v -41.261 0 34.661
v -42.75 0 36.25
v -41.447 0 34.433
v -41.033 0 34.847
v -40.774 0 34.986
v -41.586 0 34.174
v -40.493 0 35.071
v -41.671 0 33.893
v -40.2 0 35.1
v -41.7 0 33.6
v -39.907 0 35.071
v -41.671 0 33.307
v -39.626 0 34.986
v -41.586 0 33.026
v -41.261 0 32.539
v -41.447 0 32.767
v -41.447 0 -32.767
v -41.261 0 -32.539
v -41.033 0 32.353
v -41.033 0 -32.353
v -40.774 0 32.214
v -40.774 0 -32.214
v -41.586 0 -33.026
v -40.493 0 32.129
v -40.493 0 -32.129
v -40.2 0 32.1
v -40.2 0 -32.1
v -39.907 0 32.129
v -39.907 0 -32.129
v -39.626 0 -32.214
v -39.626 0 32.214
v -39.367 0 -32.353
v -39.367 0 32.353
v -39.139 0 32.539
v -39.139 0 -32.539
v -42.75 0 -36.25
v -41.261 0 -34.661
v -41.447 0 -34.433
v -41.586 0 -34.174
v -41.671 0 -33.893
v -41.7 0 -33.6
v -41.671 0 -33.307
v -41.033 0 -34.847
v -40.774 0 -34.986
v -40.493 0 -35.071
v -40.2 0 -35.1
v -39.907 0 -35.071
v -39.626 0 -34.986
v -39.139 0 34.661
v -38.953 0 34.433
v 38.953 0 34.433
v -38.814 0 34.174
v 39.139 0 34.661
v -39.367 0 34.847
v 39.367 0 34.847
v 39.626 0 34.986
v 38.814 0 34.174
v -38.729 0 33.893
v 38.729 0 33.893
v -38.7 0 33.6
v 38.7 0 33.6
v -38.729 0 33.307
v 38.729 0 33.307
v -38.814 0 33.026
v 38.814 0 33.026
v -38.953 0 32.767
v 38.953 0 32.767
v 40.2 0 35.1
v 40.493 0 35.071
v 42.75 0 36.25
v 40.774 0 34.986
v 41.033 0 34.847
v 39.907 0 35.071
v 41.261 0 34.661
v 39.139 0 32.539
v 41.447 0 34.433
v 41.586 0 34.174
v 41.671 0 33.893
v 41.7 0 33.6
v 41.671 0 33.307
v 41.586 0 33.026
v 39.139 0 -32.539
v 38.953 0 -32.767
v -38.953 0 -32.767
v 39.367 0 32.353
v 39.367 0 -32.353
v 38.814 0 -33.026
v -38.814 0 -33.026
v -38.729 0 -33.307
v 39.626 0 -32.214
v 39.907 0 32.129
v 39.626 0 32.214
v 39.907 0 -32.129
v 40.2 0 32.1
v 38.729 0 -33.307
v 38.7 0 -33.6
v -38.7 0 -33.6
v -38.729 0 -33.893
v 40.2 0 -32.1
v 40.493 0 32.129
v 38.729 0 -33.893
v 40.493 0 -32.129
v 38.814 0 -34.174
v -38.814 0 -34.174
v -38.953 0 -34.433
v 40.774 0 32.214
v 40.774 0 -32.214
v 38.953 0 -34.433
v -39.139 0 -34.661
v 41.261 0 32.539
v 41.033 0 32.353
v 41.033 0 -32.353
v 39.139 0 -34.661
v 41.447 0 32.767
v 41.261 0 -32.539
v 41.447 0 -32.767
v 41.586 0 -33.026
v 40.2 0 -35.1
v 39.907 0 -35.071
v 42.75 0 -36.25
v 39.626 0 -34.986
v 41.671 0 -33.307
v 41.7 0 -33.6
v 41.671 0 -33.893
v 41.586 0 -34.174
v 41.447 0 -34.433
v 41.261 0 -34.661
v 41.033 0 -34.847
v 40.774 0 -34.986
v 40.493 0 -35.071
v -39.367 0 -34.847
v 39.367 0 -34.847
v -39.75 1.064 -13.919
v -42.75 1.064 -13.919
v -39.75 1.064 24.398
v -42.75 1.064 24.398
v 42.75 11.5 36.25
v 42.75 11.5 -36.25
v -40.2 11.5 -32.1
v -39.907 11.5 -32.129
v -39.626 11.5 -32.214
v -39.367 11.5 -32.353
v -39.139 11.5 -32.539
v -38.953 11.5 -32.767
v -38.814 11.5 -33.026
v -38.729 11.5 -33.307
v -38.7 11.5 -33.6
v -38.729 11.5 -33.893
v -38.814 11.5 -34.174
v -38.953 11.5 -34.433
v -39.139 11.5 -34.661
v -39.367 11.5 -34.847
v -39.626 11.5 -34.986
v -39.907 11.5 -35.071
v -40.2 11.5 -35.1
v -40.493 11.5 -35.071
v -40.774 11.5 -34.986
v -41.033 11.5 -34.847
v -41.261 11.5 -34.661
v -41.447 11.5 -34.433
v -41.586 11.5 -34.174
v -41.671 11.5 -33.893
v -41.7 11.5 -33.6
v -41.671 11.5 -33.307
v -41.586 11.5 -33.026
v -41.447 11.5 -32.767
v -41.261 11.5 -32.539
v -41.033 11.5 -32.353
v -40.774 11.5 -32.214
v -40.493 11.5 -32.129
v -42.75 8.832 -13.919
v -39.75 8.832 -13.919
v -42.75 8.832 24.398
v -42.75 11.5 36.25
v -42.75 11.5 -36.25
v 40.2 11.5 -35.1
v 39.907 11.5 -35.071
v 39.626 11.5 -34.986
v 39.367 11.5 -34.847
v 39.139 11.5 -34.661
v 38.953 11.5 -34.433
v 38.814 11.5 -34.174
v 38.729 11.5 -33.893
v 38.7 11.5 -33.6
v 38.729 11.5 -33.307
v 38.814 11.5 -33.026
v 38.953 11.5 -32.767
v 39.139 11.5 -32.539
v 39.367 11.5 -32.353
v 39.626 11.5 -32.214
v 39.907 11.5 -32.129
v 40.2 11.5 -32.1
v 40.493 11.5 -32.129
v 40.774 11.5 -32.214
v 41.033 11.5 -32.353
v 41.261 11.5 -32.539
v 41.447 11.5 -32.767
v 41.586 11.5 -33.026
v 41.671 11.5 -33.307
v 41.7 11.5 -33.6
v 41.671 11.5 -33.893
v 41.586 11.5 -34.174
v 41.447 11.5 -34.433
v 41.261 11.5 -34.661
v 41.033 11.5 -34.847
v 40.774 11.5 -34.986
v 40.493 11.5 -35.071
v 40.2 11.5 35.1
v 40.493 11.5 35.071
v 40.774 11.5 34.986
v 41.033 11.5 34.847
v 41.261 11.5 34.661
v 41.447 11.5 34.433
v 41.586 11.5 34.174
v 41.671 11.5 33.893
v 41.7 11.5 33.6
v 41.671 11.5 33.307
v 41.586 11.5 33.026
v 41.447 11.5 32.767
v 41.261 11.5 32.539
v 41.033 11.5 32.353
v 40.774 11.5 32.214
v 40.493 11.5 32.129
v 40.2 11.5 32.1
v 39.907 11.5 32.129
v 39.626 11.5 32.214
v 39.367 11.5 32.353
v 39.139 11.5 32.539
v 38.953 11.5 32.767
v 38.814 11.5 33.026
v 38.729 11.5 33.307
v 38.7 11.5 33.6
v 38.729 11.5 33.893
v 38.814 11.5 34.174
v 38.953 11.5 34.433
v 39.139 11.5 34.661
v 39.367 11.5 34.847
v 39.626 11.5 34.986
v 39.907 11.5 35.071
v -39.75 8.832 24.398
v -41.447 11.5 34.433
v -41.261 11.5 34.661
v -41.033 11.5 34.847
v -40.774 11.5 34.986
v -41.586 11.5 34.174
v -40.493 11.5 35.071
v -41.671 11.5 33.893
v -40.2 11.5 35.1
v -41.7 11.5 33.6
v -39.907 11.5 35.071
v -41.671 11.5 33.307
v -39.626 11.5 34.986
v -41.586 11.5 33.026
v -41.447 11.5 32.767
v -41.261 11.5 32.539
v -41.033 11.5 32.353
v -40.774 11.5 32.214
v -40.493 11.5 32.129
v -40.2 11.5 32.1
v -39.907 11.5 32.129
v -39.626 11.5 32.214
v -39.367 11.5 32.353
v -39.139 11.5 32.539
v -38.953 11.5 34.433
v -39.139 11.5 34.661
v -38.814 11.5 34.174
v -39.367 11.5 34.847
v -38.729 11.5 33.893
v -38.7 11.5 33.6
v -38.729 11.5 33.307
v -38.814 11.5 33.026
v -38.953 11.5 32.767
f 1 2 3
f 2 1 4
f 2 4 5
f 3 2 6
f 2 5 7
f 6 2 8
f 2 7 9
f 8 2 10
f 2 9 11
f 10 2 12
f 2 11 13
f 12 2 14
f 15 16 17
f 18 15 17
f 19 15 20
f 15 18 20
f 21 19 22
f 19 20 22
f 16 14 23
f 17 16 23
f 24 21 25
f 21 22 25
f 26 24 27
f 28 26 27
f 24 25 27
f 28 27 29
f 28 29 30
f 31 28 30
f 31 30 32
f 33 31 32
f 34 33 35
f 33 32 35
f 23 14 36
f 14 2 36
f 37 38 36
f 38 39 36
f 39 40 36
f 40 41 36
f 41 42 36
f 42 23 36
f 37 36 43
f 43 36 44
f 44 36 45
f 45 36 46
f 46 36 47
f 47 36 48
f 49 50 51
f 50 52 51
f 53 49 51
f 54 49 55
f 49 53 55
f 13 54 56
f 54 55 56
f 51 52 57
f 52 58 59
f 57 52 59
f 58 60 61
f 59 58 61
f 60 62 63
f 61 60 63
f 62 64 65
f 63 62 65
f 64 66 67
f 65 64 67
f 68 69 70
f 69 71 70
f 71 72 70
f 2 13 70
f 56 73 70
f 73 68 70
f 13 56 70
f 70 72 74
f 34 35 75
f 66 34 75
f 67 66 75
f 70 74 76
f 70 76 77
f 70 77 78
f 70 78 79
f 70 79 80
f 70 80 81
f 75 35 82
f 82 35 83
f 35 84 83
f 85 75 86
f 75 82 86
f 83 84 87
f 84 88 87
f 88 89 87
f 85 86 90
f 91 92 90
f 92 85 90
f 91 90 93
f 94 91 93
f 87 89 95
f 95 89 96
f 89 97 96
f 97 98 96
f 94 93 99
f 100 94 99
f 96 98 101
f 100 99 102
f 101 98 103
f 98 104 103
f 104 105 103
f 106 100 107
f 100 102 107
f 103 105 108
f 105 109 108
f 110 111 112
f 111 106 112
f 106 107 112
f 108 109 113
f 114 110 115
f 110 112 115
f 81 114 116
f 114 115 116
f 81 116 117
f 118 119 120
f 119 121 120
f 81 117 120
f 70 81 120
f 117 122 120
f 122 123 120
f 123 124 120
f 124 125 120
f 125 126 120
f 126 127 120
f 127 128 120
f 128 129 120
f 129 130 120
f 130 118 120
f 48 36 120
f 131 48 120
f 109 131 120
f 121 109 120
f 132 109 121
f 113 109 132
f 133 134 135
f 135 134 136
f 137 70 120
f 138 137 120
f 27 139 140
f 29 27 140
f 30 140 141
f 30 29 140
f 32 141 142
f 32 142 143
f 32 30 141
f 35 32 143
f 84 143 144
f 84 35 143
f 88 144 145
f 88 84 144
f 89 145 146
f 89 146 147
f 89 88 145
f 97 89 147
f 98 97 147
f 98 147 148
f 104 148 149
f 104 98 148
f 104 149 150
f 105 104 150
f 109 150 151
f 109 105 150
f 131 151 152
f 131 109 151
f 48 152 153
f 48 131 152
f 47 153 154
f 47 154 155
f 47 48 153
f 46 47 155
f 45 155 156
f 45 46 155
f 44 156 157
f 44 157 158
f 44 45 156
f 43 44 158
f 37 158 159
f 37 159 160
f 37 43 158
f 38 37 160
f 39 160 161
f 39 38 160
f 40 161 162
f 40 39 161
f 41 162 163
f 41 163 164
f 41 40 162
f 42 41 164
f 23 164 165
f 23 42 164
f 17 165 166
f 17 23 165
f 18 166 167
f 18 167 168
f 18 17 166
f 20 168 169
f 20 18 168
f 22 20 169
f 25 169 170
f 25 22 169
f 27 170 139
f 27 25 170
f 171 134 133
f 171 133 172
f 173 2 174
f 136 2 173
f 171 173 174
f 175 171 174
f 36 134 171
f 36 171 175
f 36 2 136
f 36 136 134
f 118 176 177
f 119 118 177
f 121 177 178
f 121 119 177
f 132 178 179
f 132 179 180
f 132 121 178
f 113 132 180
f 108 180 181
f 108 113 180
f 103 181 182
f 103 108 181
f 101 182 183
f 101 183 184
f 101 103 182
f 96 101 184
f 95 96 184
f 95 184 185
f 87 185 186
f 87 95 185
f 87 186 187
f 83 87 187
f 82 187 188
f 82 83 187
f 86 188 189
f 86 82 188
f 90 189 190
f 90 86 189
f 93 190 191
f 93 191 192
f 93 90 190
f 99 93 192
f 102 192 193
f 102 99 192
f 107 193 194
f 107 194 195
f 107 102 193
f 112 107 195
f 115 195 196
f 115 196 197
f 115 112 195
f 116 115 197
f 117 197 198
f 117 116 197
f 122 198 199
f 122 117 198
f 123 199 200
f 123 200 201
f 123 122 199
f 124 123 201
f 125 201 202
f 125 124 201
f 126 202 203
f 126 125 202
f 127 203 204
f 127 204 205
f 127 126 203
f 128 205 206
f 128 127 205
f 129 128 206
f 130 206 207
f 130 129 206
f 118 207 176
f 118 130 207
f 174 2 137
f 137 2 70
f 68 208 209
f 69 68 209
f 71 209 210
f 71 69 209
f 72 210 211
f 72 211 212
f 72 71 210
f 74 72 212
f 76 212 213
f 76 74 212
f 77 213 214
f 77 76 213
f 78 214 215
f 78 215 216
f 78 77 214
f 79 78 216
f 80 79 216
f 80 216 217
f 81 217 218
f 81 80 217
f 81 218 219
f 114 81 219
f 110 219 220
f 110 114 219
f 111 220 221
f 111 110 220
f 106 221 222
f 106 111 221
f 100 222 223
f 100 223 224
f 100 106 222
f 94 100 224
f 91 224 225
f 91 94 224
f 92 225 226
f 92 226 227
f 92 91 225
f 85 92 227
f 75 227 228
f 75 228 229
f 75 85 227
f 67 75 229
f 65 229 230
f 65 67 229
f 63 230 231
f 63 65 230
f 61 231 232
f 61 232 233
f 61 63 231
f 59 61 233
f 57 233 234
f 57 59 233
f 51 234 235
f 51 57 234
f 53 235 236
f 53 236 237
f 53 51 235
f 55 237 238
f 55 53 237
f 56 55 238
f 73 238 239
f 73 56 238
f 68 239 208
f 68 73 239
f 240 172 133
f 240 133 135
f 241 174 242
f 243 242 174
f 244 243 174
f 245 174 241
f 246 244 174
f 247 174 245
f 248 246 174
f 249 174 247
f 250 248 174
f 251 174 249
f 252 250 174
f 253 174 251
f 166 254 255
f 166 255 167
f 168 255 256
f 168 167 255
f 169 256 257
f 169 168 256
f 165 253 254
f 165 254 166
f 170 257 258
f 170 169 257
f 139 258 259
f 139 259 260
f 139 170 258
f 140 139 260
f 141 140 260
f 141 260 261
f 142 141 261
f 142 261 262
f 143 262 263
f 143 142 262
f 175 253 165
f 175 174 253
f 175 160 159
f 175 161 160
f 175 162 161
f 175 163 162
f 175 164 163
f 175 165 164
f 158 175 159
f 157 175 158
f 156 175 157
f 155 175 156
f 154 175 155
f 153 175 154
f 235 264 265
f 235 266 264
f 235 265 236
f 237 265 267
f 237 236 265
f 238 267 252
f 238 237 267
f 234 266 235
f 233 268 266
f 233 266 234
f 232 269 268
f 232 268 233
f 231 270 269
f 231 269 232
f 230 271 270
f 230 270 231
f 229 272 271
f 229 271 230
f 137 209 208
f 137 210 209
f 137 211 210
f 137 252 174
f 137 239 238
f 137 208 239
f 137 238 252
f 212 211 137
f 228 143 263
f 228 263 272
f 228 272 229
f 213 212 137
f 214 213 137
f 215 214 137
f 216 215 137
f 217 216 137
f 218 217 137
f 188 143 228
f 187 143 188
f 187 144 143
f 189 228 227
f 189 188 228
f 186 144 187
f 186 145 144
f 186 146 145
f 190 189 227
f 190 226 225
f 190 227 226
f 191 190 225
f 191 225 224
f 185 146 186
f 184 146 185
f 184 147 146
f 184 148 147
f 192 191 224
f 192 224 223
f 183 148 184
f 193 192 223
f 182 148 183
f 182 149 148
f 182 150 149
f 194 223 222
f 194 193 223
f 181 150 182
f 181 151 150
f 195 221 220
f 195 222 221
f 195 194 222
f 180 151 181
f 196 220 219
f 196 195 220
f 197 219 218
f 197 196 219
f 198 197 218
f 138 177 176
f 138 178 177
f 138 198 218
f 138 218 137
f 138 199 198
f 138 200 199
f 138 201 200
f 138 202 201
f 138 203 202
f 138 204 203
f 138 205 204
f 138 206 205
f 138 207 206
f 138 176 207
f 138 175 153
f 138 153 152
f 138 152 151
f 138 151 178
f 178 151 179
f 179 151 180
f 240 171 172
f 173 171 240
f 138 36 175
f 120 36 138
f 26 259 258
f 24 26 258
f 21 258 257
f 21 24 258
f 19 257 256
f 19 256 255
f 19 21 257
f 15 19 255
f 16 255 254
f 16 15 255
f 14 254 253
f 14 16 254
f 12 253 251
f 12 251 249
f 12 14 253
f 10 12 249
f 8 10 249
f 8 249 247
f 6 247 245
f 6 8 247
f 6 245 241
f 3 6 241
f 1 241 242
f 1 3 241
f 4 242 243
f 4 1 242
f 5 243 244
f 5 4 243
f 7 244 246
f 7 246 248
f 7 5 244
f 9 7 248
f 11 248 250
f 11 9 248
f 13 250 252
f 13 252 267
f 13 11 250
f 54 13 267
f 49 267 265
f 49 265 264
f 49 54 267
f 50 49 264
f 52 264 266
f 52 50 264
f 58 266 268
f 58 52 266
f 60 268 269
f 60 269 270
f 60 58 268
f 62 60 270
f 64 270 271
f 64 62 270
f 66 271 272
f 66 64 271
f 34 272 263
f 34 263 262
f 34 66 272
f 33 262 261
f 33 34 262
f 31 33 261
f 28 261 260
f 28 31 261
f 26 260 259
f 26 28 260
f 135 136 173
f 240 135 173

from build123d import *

# Parameters (mm, degrees)
SKETCH_1_W          = 85.5
SKETCH_1_H          = 72.5
SKETCH_1_R          = 1.5
EXTRUDE_1_DEPTH     = 11.5
SKETCH_2_W          = 38.316664863
SKETCH_2_H          = 7.767596006
CUT_EXTRUDE_1_DEPTH = 3


with BuildPart() as part:
    # 草图1 → 凸台-拉伸1 (new body)
    with BuildSketch(Plane(origin=(0, 0, 0), x_dir=(1, 0, 0), z_dir=(0, 1, 0))):
        Rectangle(SKETCH_1_W, SKETCH_1_H)
        with Locations(Location((-40.2, 33.6, 0), (0, 0, 270))):
            Circle(SKETCH_1_R, mode=Mode.SUBTRACT)
        with Locations(Location((40.2, 33.6, 0), (0, 0, 90))):
            Circle(SKETCH_1_R, mode=Mode.SUBTRACT)
        with Locations(Location((40.2, -33.6, 0), (0, 0, 270))):
            Circle(SKETCH_1_R, mode=Mode.SUBTRACT)
        with Locations(Location((-40.2, -33.6, 0), (0, 0, 90))):
            Circle(SKETCH_1_R, mode=Mode.SUBTRACT)
    extrude(amount=EXTRUDE_1_DEPTH)

    # 草图2 → 切除-拉伸1 (cut)
    with BuildSketch(Plane.ZY.offset(42.75)):
        with Locations((5.239217441, 4.947785371)):
            Rectangle(SKETCH_2_W, SKETCH_2_H)
    extrude(amount=-CUT_EXTRUDE_1_DEPTH, mode=Mode.SUBTRACT)


solid = part.part
